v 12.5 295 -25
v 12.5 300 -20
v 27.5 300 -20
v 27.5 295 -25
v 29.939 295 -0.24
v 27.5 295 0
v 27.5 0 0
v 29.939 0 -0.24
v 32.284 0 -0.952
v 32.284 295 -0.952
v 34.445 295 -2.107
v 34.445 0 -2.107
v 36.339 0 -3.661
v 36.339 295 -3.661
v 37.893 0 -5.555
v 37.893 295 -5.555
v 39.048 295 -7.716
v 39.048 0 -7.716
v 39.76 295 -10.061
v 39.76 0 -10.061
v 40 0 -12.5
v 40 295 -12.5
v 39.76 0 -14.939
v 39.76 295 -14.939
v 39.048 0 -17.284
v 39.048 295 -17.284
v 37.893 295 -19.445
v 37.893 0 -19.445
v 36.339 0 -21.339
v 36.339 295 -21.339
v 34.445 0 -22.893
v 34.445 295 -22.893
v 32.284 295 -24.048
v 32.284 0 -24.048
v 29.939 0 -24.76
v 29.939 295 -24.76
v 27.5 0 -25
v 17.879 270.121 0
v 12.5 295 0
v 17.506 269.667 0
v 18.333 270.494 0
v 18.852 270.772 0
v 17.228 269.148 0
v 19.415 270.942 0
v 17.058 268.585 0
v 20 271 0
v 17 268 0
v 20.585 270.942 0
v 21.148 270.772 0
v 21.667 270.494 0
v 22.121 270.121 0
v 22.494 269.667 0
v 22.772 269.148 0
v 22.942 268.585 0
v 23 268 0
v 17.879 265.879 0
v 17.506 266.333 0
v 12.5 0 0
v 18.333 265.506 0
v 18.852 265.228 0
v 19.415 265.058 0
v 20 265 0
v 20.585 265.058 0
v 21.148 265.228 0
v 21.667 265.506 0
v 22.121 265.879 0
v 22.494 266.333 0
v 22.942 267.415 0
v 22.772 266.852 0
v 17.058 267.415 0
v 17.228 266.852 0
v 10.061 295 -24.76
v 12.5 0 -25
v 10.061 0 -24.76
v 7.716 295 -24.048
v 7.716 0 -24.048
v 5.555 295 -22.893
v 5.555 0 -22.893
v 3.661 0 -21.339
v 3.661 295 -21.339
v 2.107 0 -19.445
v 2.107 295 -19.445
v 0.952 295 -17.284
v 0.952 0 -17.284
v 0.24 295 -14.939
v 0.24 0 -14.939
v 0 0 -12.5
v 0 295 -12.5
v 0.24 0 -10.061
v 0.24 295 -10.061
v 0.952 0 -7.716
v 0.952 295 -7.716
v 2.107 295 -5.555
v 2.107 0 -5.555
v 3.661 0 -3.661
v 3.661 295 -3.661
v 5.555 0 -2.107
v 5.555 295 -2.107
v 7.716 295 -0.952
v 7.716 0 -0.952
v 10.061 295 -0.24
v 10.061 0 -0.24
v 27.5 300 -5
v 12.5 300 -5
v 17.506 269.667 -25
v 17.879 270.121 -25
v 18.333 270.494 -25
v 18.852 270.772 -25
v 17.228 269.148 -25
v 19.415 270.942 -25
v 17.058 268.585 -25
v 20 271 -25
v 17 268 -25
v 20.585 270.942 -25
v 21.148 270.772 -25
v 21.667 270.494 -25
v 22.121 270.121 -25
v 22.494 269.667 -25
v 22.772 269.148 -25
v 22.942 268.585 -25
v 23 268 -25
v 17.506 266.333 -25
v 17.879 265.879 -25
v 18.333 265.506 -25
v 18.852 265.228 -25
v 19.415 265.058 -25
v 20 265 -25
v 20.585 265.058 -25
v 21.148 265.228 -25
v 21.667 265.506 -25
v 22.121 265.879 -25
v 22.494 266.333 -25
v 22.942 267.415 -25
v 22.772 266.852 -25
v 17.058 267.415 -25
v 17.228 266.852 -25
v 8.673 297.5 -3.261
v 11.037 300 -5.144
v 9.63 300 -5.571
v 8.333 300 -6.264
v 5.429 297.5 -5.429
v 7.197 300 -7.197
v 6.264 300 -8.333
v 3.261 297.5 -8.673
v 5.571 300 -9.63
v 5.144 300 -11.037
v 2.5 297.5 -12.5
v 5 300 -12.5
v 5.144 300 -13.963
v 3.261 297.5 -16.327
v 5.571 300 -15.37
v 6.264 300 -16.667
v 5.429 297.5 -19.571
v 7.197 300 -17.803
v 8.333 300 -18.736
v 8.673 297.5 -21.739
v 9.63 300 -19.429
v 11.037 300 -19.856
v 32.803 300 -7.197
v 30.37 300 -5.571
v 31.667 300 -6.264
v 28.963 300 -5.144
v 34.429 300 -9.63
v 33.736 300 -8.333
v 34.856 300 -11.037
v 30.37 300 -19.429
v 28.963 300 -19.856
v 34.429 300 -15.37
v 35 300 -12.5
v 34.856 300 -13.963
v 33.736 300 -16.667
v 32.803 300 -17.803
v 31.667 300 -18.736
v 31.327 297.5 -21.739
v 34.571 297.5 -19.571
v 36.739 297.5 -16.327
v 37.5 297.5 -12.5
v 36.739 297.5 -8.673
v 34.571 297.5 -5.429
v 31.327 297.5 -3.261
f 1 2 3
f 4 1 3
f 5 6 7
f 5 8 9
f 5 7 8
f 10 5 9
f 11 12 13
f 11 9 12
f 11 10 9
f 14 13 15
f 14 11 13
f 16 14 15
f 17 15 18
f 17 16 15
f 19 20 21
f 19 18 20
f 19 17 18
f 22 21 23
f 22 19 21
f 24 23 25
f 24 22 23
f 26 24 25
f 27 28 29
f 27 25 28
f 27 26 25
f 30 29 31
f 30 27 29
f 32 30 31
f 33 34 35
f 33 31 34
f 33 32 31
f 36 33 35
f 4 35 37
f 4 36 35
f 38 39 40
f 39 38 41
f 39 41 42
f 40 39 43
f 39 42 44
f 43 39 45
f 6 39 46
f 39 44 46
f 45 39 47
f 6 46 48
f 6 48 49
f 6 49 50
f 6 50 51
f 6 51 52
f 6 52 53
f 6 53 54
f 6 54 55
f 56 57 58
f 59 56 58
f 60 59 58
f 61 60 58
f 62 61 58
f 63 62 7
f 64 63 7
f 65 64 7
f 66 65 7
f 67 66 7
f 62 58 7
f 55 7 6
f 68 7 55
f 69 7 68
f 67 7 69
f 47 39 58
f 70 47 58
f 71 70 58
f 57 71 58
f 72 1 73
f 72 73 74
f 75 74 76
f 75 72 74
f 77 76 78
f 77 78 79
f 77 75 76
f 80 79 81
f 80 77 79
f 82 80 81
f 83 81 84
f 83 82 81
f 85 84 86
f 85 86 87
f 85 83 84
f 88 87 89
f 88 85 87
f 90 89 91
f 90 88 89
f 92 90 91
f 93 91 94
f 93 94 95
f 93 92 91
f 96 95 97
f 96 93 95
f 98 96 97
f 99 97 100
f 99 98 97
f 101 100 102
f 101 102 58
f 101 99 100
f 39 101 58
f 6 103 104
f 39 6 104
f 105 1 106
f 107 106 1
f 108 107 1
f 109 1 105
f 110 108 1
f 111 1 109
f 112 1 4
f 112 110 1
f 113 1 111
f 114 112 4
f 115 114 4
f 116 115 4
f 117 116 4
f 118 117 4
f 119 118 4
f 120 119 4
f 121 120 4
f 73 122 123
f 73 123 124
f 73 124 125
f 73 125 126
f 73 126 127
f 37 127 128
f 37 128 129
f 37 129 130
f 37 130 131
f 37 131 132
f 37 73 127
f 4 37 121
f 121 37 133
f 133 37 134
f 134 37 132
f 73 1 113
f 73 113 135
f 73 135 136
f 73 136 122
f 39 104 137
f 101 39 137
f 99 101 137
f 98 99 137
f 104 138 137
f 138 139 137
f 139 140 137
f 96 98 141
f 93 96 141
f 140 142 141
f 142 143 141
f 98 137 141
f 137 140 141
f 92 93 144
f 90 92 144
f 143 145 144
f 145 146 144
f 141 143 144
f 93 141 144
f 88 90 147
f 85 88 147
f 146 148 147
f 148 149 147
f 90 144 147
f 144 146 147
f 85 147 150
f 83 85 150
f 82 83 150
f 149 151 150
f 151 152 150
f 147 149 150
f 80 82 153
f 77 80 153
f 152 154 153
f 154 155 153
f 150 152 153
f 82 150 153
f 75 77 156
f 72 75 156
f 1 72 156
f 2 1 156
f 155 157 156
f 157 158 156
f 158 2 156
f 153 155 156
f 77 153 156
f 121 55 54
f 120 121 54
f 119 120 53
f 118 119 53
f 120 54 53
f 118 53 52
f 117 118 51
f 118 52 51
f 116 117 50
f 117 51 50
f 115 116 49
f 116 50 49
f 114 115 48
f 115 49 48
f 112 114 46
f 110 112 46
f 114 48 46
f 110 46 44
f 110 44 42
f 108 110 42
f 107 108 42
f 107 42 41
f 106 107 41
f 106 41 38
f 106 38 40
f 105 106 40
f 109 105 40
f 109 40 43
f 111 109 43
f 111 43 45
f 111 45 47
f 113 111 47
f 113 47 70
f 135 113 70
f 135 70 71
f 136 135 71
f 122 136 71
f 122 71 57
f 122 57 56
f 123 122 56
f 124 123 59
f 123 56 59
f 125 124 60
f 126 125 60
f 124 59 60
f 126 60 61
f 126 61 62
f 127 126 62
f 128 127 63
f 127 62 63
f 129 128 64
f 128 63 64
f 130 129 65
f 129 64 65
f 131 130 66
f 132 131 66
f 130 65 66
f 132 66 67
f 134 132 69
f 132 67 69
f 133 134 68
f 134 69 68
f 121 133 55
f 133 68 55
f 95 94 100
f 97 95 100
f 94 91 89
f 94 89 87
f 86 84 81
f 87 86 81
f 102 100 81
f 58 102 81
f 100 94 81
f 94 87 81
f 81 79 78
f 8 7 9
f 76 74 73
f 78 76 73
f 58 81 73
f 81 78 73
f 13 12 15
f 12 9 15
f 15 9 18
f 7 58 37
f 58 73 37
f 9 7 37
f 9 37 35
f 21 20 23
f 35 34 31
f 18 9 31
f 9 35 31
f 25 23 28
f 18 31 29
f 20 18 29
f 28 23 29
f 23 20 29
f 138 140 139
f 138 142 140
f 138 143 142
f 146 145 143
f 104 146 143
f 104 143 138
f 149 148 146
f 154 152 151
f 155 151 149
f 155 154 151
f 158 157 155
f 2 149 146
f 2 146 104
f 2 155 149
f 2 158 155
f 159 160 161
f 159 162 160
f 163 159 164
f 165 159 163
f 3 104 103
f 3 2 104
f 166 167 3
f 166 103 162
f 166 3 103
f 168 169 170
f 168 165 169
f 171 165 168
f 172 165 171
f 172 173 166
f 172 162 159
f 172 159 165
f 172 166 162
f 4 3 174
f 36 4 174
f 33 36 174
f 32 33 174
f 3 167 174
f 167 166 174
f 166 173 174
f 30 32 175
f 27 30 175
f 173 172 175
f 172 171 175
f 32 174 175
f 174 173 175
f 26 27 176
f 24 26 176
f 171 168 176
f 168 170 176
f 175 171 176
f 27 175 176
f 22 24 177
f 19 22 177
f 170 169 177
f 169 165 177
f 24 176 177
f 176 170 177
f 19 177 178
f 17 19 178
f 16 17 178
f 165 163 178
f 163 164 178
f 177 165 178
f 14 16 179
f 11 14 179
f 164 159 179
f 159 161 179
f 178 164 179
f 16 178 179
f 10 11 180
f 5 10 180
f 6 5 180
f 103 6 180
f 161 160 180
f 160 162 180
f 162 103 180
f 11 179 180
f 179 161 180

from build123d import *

# Parameters (mm, degrees)
SKETCH1_W           = 40
SKETCH1_H           = 25
BOSS_EXTRUDE1_DEPTH = 300
FILLET1_RADIUS      = 12.5
FILLET1_LENGTH      = 300
FILLET2_RADIUS      = 12.5
FILLET2_LENGTH      = 300
CHAMFER1_SIZE       = 5
SKETCH3_R           = 3
CUT_EXTRUDE2_DEPTH  = 304.685692781


with BuildPart() as part:
    # Sketch1 → Boss-Extrude1 (new body)
    with BuildSketch(Plane(origin=(0, 0, 0), x_dir=(1, 0, 0), z_dir=(0, 1, 0))):
        with Locations((20, 12.5)):
            Rectangle(SKETCH1_W, SKETCH1_H)
    extrude(amount=BOSS_EXTRUDE1_DEPTH)

    # Fillet1: full round fillet: the end face becomes a half cylinder, R = half its width
    fillet1_face = Plane((40, 150, -12.5), x_dir=(0, 1, 0), z_dir=(1, 0, 0))  # on the end face: x along it, z out of the body
    fillet1_slab = fillet1_face.offset(-FILLET1_RADIUS / 2) * Box(FILLET1_LENGTH, 2 * FILLET1_RADIUS, FILLET1_RADIUS, mode=Mode.PRIVATE)  # the body's end, R deep
    fillet1_round = Plane((27.5, 150, -12.5), x_dir=(1, 0, 0), z_dir=(0, 1, 0)) * Cylinder(FILLET1_RADIUS, FILLET1_LENGTH, mode=Mode.PRIVATE)  # its axis R under the face
    add(fillet1_slab - fillet1_round, mode=Mode.SUBTRACT)

    # Fillet2: full round fillet: the end face becomes a half cylinder, R = half its width
    fillet2_face = Plane((0, 150, -12.5), x_dir=(0, 1, 0), z_dir=(-1, 0, 0))  # on the end face: x along it, z out of the body
    fillet2_slab = fillet2_face.offset(-FILLET2_RADIUS / 2) * Box(FILLET2_LENGTH, 2 * FILLET2_RADIUS, FILLET2_RADIUS, mode=Mode.PRIVATE)  # the body's end, R deep
    fillet2_round = Plane((12.5, 150, -12.5), x_dir=(-1, 0, 0), z_dir=(0, 1, 0)) * Cylinder(FILLET2_RADIUS, FILLET2_LENGTH, mode=Mode.PRIVATE)  # its axis R under the face
    add(fillet2_slab - fillet2_round, mode=Mode.SUBTRACT)

    # Chamfer1
    chamfer1_edges = [part.edges().sort_by_distance(p)[0] for p in [
        (20, 300, -25),
        (40, 300, -12.5),
        (20, 300, 0),
        (0, 300, -12.5),
    ]]
    chamfer(chamfer1_edges, length=CHAMFER1_SIZE)

    # Sketch3 → Cut-Extrude2 (cut, through all)
    with BuildSketch(Plane.XY):
        with Locations((20, 268)):
            Circle(SKETCH3_R)
    extrude(amount=-CUT_EXTRUDE2_DEPTH, mode=Mode.SUBTRACT)


solid = part.part
